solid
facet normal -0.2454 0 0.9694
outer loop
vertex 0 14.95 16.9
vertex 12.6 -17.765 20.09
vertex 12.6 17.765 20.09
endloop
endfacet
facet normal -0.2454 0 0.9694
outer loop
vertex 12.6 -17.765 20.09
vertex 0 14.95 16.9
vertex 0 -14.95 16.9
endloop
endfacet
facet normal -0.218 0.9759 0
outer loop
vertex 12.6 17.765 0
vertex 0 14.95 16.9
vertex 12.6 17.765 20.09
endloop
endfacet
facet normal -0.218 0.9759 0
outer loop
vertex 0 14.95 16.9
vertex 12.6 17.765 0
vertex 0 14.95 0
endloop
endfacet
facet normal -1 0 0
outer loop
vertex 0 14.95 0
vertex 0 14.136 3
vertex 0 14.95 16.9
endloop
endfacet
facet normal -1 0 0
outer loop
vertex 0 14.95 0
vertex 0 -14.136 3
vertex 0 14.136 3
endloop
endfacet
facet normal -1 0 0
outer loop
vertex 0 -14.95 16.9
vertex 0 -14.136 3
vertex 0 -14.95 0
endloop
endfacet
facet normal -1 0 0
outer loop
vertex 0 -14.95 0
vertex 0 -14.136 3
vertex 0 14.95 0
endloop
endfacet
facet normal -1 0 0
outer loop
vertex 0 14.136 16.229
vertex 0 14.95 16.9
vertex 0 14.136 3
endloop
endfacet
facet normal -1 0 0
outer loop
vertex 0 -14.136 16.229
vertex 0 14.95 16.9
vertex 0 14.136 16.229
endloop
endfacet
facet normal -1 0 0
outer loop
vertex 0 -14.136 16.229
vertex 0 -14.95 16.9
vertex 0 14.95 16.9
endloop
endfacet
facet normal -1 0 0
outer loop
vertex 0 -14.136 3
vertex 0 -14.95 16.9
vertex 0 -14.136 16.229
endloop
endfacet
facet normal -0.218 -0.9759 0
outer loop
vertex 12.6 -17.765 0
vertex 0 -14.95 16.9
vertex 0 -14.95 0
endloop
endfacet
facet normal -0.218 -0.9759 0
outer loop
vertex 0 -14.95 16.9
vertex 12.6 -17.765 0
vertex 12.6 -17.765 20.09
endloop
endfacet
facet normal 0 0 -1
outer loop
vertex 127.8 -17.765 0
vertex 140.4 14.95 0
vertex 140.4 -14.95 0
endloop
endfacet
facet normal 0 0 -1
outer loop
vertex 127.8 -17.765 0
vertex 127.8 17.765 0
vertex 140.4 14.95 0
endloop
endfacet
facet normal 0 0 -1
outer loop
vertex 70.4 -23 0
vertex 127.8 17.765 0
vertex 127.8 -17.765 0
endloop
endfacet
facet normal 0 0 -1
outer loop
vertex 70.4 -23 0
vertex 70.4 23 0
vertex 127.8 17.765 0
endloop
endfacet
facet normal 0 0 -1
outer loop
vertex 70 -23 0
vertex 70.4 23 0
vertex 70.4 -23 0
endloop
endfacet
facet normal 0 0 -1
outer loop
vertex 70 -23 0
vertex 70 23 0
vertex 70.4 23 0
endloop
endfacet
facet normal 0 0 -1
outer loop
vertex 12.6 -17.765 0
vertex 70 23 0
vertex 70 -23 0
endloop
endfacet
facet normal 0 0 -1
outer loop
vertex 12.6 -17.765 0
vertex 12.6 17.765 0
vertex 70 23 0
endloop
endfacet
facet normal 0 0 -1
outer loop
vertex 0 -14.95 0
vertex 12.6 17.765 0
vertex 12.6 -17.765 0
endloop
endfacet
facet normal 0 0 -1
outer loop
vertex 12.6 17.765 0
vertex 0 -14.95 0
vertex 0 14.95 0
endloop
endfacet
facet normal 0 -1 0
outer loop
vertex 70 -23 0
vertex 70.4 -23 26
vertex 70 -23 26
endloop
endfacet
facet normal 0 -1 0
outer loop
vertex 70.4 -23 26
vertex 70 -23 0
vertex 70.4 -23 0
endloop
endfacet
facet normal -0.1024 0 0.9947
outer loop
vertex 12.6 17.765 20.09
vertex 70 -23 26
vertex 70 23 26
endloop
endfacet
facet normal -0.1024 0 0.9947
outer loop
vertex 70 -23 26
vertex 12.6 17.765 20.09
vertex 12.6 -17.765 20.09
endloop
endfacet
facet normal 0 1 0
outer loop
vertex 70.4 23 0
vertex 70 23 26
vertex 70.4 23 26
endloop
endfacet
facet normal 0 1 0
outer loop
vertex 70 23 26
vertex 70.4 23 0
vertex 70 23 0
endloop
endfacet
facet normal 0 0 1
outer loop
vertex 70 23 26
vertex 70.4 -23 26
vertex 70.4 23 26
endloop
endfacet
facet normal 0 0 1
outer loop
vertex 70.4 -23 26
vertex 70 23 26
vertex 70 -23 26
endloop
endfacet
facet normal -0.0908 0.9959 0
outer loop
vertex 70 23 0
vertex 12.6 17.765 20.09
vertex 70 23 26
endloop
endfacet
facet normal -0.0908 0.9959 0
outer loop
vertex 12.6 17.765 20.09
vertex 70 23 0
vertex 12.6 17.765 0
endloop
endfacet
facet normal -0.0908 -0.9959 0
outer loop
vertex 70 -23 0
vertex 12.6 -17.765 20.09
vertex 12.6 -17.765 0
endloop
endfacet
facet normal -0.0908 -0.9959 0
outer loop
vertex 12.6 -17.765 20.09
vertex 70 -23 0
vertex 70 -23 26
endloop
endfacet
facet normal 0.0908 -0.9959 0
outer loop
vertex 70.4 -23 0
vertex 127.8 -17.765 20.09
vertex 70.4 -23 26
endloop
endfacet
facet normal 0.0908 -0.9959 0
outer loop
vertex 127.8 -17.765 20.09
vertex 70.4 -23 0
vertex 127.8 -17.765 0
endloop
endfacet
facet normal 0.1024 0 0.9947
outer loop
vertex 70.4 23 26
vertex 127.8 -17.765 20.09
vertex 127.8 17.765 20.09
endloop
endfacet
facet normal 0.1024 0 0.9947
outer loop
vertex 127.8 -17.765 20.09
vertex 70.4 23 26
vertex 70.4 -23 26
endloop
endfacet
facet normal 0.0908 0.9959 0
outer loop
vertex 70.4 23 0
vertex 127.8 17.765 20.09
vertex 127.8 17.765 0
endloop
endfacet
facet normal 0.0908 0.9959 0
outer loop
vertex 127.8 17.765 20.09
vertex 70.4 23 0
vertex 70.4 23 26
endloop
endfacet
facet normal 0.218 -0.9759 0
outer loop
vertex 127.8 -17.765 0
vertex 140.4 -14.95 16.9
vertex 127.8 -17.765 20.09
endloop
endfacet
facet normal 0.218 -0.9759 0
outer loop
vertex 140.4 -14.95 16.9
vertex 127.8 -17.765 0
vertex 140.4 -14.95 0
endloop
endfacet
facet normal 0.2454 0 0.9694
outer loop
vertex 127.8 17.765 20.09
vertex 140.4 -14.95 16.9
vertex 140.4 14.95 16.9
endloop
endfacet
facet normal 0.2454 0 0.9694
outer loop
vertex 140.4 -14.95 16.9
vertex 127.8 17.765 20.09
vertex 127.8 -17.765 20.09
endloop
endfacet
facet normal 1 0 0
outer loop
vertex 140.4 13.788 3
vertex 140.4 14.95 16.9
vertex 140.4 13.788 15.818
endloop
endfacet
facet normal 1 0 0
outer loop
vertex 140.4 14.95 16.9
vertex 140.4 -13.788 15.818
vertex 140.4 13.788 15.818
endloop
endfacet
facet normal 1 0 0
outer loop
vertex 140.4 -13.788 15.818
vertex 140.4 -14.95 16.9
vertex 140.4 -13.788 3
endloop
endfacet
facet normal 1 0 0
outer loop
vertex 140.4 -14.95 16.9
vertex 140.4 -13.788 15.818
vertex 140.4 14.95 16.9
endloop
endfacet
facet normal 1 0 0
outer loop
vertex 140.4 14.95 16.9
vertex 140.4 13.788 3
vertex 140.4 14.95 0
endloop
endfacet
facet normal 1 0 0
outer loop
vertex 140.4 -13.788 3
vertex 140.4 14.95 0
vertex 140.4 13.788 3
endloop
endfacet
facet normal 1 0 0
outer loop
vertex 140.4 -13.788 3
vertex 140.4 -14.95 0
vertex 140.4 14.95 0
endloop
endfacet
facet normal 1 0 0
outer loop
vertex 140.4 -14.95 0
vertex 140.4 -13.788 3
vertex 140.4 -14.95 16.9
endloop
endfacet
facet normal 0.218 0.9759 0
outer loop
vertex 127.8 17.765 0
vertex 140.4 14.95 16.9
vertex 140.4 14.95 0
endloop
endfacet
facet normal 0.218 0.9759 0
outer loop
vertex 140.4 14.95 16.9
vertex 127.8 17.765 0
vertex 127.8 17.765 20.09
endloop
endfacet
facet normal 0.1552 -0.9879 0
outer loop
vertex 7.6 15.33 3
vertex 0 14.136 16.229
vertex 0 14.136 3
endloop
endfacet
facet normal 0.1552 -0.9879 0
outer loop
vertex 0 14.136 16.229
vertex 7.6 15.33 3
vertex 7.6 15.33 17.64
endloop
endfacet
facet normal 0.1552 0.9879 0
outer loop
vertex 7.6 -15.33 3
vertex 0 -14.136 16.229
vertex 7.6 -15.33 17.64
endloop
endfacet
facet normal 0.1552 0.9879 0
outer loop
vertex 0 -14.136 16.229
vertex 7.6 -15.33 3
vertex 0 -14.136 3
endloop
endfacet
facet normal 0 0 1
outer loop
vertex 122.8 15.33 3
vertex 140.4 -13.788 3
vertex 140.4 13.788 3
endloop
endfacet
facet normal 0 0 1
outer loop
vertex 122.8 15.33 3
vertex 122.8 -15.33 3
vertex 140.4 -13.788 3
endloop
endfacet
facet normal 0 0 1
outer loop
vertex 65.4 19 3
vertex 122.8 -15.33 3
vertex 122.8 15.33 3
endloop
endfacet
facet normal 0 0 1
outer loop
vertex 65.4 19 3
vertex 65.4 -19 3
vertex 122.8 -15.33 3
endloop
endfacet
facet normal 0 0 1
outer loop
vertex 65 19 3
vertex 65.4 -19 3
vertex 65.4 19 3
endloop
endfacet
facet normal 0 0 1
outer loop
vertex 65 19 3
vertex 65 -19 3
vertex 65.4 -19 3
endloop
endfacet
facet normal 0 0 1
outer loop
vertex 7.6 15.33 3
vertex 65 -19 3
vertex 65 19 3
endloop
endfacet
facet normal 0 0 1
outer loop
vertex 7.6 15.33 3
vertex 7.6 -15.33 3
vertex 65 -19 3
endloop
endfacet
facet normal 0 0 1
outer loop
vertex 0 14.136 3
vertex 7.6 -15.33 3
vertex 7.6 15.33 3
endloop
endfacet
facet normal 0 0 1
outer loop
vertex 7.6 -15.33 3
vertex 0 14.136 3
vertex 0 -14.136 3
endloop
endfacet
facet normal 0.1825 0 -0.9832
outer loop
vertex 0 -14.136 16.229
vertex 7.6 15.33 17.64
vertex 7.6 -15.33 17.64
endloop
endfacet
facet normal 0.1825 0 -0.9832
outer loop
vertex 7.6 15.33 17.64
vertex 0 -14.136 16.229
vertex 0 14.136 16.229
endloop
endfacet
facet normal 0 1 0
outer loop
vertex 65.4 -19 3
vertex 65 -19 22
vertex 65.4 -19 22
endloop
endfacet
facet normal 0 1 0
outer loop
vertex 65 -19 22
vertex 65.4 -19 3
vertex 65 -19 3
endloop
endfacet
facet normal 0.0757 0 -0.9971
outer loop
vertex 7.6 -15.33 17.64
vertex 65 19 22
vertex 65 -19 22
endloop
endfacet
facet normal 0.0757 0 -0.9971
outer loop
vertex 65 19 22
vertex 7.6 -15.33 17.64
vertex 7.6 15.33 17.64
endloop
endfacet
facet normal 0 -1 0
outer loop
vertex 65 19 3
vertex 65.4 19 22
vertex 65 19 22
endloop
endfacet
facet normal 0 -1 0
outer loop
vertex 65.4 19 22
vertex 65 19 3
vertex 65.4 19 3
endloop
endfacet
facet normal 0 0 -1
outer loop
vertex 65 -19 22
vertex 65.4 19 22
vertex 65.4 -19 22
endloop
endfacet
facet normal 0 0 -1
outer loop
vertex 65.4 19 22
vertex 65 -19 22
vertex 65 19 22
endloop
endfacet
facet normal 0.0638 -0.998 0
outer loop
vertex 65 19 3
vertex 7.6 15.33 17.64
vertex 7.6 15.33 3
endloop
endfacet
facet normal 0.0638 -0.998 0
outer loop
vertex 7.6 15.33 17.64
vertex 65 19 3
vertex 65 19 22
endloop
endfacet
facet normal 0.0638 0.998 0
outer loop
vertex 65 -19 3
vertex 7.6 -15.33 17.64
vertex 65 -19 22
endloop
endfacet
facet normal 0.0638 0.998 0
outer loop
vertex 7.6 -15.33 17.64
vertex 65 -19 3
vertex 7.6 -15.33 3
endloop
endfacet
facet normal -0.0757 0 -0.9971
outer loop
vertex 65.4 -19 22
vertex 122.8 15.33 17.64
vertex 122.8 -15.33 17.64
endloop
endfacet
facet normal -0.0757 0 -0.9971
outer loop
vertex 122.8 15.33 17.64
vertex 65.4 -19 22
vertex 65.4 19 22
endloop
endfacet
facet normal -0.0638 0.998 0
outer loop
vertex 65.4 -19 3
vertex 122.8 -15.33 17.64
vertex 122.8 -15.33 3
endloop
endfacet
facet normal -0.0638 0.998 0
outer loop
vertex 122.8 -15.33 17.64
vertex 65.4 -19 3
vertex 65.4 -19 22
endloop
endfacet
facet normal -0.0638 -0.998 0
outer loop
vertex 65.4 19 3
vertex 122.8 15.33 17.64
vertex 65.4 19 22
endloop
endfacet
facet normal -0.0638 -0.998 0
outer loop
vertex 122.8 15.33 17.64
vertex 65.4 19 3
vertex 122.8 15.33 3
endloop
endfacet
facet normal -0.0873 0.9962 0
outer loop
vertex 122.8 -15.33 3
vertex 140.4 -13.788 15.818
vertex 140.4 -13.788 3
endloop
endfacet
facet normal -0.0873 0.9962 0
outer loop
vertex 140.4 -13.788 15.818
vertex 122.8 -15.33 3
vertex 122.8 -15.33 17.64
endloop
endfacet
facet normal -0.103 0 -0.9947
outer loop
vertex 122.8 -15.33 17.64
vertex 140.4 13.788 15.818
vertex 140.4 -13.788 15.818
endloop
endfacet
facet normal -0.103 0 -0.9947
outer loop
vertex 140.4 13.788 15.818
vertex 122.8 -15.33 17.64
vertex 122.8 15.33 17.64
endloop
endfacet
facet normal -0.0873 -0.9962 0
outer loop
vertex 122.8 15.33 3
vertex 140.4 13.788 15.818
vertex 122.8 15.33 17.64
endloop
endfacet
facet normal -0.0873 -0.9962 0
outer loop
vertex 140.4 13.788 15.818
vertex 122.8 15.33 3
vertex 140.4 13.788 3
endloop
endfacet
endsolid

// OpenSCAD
$fn = 32;

// ----------------------------------------------------------------------
// Faired channel: 140 x 46 x 26 mm, 4 mm walls, faired ends
// ----------------------------------------------------------------------

// --- parameters (mm) ---
length = 140;             // channel length
width = 46;               // channel width at mid length
height = 26;              // channel height at mid length
wall = 4;                 // side wall thickness
floor_t = 3;              // floor thickness
end_w = 29.9;             // faired end width
end_h = 16.9;             // faired end height

difference() {
  union() {
    hull() {
      translate([0, -14.95, 0]) cube([0.4, 29.9, 16.9]);
      translate([12.6, -17.765, 0]) cube([0.4, 35.53, 20.09]);
    }
    hull() {
      translate([12.6, -17.765, 0]) cube([0.4, 35.53, 20.09]);
      translate([70, -23, 0]) cube([0.4, 46, 26]);
    }
    hull() {
      translate([70, -23, 0]) cube([0.4, 46, 26]);
      translate([127.4, -17.765, 0]) cube([0.4, 35.53, 20.09]);
    }
    hull() {
      translate([127.4, -17.765, 0]) cube([0.4, 35.53, 20.09]);
      translate([140, -14.95, 0]) cube([0.4, 29.9, 16.9]);
    }
  }
  /* cavity, 5 mm proud of both ends so the ports are cut clean */
  hull() {
    translate([-5, -13.35, 3]) cube([0.4, 26.7, 12.3]);
    translate([7.6, -15.33, 3]) cube([0.4, 30.66, 14.64]);
  }
  hull() {
    translate([7.6, -15.33, 3]) cube([0.4, 30.66, 14.64]);
    translate([65, -19, 3]) cube([0.4, 38, 19]);
  }
  hull() {
    translate([65, -19, 3]) cube([0.4, 38, 19]);
    translate([122.4, -15.33, 3]) cube([0.4, 30.66, 14.64]);
  }
  hull() {
    translate([122.4, -15.33, 3]) cube([0.4, 30.66, 14.64]);
    translate([145, -13.35, 3]) cube([0.4, 26.7, 12.3]);
  }
}
